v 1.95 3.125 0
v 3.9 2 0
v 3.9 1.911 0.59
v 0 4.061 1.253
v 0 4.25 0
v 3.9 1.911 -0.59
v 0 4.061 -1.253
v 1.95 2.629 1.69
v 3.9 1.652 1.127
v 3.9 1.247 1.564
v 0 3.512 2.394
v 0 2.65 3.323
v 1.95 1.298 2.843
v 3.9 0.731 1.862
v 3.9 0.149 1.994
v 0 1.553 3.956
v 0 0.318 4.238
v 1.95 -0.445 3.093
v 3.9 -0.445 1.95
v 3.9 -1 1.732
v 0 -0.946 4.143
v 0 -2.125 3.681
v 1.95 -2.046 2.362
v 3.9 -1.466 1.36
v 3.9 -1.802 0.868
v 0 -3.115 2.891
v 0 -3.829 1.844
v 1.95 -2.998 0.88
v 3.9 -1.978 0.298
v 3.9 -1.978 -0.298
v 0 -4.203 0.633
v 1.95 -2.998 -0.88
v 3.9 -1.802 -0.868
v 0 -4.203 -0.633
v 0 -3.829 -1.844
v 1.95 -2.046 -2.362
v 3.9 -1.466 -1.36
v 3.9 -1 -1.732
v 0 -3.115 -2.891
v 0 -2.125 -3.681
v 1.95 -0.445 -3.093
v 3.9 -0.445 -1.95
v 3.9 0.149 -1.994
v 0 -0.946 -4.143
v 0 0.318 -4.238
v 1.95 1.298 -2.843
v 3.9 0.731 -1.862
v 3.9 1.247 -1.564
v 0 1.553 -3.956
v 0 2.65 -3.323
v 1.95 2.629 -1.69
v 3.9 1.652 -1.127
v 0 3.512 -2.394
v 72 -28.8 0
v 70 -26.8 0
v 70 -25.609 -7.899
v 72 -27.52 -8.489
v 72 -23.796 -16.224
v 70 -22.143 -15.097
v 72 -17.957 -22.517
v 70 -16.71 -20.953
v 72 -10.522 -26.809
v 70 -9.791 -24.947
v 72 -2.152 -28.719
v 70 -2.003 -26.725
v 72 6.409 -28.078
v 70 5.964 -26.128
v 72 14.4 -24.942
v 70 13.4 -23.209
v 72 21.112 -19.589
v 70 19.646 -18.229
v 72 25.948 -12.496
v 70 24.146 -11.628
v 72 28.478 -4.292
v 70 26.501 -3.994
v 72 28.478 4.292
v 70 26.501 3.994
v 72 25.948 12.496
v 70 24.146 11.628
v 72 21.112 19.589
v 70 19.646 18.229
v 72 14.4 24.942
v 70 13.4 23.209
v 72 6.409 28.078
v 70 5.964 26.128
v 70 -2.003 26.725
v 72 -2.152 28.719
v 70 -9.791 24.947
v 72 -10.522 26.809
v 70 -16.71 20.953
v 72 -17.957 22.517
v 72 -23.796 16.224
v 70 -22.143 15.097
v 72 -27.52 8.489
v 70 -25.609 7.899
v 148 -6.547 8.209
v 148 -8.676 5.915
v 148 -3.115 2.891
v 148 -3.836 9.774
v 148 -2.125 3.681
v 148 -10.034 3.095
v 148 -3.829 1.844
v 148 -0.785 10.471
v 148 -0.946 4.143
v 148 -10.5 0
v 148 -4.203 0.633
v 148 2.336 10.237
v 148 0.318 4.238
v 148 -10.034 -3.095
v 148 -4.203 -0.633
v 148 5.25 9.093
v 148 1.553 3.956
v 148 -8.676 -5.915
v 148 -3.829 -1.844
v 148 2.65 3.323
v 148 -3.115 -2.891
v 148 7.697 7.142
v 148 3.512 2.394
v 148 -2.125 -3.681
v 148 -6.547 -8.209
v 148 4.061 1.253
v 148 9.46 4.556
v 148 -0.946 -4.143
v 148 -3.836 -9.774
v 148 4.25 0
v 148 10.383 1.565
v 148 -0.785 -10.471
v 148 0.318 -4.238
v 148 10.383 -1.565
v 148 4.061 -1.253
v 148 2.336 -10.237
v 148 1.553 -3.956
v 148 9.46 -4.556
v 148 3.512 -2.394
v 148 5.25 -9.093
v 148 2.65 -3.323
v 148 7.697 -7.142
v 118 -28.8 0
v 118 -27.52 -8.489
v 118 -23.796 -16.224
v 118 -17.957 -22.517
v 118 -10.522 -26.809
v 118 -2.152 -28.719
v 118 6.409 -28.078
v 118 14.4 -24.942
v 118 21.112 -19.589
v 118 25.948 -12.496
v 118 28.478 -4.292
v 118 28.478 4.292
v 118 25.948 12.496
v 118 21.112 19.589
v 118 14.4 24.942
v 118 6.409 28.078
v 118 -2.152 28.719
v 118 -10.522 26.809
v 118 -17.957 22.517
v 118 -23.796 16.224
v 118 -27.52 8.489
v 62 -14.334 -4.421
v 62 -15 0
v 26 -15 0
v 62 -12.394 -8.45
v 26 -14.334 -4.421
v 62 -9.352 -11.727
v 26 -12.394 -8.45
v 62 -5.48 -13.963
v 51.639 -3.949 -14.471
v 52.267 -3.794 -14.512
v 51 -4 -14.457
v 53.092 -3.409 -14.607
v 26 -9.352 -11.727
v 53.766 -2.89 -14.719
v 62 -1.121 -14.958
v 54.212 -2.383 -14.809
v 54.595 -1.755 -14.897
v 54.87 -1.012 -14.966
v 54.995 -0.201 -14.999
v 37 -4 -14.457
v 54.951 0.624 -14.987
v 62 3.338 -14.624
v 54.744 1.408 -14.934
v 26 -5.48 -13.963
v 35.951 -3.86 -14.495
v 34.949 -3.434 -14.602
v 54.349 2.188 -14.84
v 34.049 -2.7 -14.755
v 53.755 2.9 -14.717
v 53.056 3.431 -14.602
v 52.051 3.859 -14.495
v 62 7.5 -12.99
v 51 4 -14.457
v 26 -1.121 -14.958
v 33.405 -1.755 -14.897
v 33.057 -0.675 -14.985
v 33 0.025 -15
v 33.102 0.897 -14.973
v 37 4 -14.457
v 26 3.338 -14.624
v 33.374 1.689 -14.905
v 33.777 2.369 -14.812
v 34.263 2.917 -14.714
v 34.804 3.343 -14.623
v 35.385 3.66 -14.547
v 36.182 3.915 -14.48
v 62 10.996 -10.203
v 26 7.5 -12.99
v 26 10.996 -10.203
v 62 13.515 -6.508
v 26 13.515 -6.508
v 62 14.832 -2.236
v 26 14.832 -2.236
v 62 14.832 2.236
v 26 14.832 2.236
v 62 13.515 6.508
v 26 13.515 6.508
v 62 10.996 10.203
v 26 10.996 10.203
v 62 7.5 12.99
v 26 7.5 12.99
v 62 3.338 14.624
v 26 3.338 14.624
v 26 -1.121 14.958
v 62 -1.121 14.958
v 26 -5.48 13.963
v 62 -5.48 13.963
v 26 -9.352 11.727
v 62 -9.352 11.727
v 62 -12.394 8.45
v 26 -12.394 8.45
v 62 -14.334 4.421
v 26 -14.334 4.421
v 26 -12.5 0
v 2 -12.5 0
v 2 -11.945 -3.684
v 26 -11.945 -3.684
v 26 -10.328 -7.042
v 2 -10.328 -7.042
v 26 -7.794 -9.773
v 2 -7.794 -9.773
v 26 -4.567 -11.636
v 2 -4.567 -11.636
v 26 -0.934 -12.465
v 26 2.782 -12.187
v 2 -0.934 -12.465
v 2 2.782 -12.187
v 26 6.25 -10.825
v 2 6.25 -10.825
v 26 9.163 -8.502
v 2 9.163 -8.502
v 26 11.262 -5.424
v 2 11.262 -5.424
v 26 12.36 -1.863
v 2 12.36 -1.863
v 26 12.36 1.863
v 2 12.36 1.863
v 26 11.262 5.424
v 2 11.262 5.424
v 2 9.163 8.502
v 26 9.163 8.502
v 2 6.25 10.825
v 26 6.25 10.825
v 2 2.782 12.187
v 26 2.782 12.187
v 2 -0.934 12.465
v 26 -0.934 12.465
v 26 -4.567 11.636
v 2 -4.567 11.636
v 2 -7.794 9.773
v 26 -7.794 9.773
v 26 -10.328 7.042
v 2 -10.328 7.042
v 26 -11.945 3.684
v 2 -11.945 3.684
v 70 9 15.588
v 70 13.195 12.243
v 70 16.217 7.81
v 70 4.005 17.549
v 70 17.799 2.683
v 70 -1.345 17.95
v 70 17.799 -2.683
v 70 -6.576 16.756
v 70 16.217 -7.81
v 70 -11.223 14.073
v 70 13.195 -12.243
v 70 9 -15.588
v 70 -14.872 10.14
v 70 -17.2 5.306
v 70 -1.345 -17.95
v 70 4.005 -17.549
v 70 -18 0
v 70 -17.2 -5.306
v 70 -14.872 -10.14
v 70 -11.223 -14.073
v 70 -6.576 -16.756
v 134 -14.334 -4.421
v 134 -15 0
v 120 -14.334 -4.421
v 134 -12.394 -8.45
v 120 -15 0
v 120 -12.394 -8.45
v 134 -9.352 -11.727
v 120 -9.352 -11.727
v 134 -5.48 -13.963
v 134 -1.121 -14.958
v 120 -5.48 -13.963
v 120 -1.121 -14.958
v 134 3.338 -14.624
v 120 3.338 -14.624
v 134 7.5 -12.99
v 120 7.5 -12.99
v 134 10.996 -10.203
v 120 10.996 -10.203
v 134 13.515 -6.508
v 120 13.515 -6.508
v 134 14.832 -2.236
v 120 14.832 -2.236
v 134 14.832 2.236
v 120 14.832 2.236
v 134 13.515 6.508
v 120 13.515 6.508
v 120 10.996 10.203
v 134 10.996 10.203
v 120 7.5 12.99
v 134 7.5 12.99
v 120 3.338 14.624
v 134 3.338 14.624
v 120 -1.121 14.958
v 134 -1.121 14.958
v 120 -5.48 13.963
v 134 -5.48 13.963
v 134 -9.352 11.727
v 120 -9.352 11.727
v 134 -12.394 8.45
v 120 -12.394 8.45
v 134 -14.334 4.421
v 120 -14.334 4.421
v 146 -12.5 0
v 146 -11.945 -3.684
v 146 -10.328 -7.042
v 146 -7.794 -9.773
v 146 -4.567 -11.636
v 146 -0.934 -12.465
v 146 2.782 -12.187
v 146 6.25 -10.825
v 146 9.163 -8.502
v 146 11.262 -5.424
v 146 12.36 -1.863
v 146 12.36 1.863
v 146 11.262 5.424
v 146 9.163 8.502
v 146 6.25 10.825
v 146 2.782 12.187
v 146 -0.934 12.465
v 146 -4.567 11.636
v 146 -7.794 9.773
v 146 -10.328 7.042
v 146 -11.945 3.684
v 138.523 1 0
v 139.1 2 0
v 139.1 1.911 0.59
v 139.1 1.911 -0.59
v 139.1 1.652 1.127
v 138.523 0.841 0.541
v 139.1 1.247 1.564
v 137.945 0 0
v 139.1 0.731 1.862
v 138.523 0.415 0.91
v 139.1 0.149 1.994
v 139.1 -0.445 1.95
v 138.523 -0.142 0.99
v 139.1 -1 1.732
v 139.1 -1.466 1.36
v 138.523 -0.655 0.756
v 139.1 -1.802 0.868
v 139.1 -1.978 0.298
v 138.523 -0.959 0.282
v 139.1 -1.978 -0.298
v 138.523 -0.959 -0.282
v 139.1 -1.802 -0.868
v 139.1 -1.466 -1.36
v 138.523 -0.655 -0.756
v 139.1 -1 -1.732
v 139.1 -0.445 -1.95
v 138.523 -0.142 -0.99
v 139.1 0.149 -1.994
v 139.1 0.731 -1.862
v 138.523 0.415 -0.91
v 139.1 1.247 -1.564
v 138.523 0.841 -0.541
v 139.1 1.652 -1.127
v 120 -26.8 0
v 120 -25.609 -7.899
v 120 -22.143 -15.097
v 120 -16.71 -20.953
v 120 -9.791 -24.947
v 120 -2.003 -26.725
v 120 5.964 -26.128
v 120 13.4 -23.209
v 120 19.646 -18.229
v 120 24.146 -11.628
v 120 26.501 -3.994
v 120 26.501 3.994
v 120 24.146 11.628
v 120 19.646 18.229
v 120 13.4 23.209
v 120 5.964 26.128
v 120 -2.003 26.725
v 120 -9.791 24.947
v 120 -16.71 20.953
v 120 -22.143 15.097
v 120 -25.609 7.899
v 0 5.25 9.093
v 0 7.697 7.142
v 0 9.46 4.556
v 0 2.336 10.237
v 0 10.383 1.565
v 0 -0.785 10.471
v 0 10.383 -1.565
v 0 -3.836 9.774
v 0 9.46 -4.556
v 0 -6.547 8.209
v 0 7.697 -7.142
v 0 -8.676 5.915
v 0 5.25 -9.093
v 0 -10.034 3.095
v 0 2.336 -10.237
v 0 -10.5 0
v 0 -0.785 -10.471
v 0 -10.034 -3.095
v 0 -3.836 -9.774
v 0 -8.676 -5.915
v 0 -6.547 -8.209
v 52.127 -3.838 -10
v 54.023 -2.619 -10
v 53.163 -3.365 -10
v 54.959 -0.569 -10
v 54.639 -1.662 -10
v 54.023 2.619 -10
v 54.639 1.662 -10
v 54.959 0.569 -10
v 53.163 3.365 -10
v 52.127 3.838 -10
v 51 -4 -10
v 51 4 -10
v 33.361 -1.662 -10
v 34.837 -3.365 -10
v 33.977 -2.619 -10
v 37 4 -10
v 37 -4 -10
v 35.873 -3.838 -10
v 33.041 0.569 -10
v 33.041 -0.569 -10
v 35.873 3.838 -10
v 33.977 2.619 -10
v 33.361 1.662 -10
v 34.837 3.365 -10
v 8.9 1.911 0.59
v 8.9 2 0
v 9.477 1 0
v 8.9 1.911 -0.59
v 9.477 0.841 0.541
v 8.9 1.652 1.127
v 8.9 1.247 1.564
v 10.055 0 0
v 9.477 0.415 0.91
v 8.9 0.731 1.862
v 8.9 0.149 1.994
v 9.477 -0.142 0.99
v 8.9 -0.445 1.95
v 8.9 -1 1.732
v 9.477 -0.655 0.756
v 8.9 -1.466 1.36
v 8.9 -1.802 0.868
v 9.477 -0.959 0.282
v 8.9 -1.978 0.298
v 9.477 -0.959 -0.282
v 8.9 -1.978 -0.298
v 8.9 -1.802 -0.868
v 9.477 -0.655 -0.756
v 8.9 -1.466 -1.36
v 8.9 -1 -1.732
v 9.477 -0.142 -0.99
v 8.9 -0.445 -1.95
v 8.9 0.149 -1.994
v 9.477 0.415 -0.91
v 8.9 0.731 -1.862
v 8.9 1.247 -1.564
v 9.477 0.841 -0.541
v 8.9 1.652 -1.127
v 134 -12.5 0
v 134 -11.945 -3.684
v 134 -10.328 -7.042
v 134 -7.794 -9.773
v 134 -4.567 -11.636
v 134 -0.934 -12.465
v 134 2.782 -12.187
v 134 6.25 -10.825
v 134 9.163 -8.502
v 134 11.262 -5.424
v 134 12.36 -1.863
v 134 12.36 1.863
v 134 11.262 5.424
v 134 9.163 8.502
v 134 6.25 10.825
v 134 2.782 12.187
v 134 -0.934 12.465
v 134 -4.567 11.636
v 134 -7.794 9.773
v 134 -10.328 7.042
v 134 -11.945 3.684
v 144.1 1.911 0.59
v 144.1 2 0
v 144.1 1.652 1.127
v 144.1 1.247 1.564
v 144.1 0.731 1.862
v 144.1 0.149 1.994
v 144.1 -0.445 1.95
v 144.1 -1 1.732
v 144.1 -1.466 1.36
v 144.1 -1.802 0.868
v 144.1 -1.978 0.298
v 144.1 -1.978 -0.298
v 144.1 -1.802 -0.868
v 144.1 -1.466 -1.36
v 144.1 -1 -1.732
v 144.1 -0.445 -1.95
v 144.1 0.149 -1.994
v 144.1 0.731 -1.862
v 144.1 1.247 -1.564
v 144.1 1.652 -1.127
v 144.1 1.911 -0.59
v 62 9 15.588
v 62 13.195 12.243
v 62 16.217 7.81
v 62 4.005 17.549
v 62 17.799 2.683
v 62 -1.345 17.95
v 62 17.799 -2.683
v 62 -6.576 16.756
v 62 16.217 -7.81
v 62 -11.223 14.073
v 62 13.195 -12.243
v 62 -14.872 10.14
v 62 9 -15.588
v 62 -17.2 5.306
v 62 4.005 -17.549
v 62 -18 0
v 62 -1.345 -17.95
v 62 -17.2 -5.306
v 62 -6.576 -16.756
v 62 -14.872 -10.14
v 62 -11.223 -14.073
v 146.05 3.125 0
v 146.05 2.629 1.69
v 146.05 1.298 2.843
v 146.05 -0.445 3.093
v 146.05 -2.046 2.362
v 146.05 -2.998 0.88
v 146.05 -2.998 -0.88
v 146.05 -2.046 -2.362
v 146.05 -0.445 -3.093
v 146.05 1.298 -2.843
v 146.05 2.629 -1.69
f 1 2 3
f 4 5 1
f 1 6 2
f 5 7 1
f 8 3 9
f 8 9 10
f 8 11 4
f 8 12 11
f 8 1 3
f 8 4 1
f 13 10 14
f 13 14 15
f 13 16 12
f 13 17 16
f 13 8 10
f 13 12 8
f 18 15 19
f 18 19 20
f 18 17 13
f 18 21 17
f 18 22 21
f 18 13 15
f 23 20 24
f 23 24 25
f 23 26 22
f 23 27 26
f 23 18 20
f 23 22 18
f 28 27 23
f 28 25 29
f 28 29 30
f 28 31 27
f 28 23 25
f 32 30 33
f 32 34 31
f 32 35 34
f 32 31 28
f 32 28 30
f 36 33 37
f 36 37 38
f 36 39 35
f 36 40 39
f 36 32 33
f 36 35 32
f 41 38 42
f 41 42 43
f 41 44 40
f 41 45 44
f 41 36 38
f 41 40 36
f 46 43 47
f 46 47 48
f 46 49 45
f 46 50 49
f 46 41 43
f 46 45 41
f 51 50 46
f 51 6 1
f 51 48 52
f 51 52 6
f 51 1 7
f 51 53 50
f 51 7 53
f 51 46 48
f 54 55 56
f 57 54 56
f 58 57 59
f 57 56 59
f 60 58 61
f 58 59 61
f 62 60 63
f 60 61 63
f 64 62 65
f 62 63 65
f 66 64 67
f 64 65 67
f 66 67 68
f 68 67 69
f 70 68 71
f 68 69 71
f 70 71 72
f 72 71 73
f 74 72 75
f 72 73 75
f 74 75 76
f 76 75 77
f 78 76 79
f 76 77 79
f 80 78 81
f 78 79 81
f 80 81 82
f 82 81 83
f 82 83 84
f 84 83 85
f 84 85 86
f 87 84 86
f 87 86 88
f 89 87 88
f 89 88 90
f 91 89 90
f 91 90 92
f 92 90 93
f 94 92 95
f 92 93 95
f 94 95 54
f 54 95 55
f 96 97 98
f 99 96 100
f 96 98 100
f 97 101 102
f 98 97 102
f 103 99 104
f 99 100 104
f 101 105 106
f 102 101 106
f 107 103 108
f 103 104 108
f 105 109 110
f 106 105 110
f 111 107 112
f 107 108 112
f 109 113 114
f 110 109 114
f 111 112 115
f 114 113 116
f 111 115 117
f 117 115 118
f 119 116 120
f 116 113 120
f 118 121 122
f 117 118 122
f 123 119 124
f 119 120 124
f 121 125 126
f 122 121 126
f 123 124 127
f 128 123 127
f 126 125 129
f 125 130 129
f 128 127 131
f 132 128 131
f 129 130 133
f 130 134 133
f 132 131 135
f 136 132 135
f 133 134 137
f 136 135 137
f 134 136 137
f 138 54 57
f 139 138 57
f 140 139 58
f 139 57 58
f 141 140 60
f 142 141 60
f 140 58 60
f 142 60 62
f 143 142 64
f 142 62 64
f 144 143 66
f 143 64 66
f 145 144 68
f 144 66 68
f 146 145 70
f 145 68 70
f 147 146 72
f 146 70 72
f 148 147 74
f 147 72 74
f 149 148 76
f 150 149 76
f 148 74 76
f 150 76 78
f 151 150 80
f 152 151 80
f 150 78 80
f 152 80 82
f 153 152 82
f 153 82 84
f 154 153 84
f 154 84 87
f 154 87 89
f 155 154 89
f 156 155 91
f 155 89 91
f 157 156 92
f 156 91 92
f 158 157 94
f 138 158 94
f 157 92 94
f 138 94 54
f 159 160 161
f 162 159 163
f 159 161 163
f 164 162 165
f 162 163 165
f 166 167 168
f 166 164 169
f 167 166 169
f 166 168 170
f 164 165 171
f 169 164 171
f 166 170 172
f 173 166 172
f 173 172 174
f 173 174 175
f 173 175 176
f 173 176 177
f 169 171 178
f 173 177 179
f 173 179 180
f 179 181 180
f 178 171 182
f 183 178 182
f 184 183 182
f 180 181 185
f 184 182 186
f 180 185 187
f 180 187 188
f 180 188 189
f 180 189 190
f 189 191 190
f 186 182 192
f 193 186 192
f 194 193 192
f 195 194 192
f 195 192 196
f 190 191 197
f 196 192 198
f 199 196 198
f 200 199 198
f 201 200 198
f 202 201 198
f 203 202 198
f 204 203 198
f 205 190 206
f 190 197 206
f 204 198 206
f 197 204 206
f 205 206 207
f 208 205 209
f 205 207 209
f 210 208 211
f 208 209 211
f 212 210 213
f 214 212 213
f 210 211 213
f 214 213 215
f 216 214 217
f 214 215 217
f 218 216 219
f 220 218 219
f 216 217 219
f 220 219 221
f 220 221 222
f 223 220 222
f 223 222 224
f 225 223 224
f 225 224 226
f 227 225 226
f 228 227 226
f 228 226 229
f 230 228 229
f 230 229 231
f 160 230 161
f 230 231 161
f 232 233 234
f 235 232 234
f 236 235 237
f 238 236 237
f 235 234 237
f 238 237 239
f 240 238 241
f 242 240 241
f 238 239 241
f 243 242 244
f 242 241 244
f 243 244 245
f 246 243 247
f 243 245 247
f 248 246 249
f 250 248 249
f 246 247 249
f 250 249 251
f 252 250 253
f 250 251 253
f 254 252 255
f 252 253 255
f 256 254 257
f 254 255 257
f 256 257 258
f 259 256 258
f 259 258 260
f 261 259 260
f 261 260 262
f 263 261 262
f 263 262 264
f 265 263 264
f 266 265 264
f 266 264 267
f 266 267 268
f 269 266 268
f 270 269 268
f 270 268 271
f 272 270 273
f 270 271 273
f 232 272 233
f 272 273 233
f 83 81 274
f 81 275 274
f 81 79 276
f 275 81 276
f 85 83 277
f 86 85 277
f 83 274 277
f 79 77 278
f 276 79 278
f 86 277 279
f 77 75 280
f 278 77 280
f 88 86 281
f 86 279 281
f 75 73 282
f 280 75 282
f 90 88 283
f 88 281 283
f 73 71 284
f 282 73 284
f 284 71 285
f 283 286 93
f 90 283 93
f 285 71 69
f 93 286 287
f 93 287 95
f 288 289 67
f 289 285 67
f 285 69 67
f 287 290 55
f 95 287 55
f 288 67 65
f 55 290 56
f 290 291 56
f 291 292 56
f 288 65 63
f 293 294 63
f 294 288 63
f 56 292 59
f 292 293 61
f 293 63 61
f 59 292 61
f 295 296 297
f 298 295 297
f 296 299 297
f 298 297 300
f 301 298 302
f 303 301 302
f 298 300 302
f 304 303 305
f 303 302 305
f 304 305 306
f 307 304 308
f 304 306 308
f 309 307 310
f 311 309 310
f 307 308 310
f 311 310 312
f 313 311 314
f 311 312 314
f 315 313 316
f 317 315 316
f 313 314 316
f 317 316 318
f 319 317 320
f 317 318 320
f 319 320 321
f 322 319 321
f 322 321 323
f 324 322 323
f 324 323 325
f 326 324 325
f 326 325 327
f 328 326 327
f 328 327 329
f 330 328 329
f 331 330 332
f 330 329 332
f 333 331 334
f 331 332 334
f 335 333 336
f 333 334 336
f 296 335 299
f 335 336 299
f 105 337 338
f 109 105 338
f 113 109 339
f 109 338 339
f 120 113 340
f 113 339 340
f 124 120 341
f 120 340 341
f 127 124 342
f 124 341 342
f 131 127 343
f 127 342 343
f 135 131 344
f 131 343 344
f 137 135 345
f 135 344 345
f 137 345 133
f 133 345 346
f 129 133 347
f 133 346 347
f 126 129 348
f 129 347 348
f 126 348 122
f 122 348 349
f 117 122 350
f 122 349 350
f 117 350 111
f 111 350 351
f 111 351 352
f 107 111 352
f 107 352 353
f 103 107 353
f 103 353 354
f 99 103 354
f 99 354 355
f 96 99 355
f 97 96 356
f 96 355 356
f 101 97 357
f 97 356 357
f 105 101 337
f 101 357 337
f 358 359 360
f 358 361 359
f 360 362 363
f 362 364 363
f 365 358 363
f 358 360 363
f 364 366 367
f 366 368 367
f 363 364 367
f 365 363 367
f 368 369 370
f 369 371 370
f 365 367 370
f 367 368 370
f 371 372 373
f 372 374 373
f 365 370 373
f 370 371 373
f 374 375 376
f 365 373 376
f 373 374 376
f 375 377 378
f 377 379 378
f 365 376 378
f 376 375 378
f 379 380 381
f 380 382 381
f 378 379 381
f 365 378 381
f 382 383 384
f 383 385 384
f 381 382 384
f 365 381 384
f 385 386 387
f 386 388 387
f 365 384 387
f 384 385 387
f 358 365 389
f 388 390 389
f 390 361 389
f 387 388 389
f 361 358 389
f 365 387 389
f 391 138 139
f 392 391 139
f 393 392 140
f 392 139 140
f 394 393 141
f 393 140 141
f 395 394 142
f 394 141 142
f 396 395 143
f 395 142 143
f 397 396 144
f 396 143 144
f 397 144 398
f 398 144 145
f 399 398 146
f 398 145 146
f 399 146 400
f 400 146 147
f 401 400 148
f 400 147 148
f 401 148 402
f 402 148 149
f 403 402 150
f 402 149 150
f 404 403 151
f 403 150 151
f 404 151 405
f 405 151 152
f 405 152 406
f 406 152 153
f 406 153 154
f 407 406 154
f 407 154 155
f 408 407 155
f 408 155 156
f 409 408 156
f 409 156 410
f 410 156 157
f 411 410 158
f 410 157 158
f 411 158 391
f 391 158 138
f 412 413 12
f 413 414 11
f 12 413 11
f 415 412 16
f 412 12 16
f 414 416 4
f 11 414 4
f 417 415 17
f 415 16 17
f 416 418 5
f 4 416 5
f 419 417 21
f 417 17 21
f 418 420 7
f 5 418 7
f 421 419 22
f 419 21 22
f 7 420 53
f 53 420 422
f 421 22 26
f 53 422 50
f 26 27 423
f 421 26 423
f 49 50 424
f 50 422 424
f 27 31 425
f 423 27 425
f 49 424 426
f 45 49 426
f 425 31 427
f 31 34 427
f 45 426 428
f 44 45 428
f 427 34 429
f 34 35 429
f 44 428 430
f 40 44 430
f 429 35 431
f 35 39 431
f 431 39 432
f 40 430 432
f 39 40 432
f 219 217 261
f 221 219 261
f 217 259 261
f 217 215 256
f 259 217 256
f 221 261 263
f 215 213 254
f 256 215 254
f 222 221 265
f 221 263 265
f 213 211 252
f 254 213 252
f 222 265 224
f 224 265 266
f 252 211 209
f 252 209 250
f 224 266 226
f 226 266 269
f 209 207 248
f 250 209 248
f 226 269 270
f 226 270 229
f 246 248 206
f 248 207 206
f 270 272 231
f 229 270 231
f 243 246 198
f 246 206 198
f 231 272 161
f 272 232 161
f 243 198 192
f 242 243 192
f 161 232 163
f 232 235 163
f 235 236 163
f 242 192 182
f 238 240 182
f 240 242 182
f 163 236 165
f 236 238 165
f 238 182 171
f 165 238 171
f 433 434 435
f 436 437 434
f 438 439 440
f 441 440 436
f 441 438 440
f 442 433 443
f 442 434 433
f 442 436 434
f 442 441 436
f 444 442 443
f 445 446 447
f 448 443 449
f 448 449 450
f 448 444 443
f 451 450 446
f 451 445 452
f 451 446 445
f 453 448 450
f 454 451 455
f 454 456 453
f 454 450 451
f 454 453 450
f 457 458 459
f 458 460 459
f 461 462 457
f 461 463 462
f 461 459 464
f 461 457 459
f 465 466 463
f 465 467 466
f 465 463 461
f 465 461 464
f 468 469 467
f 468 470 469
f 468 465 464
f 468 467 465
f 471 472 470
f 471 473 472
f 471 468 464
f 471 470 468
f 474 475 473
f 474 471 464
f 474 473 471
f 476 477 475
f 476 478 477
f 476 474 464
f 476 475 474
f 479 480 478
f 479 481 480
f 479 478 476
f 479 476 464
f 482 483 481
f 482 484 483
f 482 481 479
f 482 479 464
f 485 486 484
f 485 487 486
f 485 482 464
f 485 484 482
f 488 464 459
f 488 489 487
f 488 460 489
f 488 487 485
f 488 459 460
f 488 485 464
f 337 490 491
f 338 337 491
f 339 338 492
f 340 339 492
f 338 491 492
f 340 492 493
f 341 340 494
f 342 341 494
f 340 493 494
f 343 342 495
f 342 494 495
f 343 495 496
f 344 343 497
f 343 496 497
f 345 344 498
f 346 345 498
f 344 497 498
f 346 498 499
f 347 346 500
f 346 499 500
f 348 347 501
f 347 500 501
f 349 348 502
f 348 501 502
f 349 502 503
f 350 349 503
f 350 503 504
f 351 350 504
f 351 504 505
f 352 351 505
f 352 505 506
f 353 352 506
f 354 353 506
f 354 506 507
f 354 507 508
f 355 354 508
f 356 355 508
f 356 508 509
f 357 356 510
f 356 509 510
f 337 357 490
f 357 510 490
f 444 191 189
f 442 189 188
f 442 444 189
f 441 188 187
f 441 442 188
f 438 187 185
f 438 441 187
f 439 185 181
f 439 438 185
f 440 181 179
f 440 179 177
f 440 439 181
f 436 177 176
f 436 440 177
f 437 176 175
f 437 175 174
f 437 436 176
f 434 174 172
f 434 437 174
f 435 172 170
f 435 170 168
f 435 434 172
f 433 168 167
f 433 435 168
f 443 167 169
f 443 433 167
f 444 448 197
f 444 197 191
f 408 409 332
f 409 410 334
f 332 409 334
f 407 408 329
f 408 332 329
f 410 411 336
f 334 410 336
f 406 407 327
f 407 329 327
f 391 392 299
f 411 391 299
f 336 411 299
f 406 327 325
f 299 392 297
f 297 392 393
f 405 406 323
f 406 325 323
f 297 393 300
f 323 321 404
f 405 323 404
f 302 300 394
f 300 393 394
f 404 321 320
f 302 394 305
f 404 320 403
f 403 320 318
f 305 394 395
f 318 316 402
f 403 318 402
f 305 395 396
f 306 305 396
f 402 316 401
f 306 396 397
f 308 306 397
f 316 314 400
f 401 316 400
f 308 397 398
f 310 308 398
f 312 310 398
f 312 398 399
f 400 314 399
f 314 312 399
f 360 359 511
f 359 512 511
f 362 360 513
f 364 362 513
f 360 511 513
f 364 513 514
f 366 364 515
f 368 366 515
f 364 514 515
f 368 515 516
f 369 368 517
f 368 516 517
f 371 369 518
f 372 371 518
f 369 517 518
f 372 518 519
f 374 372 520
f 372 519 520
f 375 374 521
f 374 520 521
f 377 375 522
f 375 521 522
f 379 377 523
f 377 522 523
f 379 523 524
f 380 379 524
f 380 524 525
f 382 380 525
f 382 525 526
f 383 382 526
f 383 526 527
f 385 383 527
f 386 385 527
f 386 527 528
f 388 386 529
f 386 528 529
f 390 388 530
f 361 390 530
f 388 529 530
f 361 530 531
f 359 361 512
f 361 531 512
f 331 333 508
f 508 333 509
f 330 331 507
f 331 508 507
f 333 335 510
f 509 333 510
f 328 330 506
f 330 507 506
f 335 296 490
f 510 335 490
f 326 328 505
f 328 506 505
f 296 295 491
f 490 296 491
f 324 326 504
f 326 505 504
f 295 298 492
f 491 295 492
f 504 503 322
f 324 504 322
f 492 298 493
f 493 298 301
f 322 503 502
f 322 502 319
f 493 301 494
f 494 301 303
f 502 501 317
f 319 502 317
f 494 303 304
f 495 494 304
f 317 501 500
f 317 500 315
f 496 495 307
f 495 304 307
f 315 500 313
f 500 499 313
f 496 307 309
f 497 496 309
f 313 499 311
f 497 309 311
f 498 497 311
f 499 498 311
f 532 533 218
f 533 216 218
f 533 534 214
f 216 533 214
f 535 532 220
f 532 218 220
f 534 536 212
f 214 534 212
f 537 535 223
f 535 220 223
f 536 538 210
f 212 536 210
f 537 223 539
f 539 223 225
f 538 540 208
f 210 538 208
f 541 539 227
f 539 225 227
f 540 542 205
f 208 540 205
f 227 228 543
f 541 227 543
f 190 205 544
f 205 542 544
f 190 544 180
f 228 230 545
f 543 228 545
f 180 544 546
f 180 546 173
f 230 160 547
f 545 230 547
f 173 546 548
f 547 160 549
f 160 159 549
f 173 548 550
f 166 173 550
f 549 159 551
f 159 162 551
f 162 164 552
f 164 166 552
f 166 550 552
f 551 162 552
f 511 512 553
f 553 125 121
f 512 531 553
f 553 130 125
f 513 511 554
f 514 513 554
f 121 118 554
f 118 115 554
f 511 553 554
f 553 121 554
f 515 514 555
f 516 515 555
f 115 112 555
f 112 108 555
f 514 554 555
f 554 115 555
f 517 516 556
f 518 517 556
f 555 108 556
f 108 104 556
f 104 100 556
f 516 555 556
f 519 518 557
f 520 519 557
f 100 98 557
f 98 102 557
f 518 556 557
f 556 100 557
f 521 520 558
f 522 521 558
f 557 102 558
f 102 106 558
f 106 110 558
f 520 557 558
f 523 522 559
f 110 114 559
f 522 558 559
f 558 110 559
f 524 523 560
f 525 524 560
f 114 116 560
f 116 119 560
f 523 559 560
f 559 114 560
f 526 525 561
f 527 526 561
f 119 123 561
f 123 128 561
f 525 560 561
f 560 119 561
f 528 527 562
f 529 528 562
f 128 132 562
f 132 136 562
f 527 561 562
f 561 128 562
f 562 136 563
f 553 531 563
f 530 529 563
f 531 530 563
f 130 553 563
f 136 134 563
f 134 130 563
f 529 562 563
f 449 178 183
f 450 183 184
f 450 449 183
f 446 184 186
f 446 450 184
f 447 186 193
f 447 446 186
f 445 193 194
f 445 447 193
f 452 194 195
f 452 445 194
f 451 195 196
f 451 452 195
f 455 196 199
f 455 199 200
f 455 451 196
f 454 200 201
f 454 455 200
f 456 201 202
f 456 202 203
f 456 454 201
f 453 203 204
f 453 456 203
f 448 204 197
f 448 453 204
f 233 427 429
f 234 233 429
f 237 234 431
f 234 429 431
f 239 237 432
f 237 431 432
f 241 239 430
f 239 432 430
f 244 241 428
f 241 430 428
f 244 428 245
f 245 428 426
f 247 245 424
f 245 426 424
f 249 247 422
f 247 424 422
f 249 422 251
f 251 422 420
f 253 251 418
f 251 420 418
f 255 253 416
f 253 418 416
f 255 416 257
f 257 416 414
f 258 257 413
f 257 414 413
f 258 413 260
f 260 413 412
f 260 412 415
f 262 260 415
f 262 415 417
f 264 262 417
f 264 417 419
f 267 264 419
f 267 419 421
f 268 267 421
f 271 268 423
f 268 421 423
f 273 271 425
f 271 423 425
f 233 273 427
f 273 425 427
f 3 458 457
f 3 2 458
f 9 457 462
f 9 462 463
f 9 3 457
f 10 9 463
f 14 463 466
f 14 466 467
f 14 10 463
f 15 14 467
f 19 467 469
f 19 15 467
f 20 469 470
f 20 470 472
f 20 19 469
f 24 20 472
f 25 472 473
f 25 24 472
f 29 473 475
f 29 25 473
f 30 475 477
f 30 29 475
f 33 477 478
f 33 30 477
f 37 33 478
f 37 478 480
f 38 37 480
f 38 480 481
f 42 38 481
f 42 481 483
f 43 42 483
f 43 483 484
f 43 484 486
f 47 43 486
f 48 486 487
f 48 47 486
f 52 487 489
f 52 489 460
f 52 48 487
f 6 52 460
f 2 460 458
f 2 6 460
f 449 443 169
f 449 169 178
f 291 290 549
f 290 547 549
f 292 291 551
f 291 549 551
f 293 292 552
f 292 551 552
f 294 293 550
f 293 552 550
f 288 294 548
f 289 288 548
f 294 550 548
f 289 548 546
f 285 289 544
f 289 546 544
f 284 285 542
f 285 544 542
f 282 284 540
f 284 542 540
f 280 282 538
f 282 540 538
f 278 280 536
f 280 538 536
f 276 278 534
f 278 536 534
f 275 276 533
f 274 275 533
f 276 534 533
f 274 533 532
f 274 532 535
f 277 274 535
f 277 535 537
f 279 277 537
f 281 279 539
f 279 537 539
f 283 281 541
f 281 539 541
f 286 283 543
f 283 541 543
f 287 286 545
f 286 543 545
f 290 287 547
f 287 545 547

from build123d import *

# Parameters (mm, degrees)
CUT_EXTRUDE_START   = -10
CUT_EXTRUDE_1_DEPTH = 10
CHAMFER_1_SIZE      = 2


with BuildPart() as part:
    # Эскиз2 → Повернуть1 (revolve)
    with BuildSketch(Plane.XY):
        Polygon((0, 0), (148, 0), (148, -12.5), (134, -12.5), (134, -15), (120, -15), (120, -28.8), (70, -28.8), (70, -18), (62, -18), (62, -15), (26, -15), (26, -12.5), (0, -12.5), align=None)
    revolve(axis=Axis((0, 0, 0), (1, 0, 0)))

    # Эскиз3 → Вырез-Повернуть1 (revolve, cut)
    with BuildSketch(Plane.XY):
        Polygon((0, 0), (10.054700538, 0), (8.9, 2), (3.9, 2), (0, 4.25), align=None)
    cut_revolve_1 = revolve(axis=Axis((0, 0, 0), (1, 0, 0)), mode=Mode.SUBTRACT)

    # Зеркальное отражение1: Вырез-Повернуть1 across plane
    add(cut_revolve_1.mirror(Plane(origin=(74, 0, 0), x_dir=(0, 0, 1), z_dir=(1, 0, 0))), mode=Mode.SUBTRACT)

    # Эскиз4 → Вырез-Вытянуть1 (cut)
    with BuildSketch(Plane.XY.offset(CUT_EXTRUDE_START)):
        with BuildLine():
            Line((37, 4), (51, 4))
            ThreePointArc((51, 4), (55, 0), (51, -4))
            Line((51, -4), (37, -4))
            ThreePointArc((37, -4), (33, 0), (37, 4))
        make_face()
    extrude(amount=-CUT_EXTRUDE_1_DEPTH, mode=Mode.SUBTRACT)

    # Фаска1
    chamfer_1_edges = [part.edges().sort_by_distance(p)[0] for p in [
        (0, 12.5, 0),
        (70, 28.8, 0),
        (120, 28.8, 0),
        (148, 12.5, 0),
    ]]
    chamfer(chamfer_1_edges, length=CHAMFER_1_SIZE)


solid = part.part
